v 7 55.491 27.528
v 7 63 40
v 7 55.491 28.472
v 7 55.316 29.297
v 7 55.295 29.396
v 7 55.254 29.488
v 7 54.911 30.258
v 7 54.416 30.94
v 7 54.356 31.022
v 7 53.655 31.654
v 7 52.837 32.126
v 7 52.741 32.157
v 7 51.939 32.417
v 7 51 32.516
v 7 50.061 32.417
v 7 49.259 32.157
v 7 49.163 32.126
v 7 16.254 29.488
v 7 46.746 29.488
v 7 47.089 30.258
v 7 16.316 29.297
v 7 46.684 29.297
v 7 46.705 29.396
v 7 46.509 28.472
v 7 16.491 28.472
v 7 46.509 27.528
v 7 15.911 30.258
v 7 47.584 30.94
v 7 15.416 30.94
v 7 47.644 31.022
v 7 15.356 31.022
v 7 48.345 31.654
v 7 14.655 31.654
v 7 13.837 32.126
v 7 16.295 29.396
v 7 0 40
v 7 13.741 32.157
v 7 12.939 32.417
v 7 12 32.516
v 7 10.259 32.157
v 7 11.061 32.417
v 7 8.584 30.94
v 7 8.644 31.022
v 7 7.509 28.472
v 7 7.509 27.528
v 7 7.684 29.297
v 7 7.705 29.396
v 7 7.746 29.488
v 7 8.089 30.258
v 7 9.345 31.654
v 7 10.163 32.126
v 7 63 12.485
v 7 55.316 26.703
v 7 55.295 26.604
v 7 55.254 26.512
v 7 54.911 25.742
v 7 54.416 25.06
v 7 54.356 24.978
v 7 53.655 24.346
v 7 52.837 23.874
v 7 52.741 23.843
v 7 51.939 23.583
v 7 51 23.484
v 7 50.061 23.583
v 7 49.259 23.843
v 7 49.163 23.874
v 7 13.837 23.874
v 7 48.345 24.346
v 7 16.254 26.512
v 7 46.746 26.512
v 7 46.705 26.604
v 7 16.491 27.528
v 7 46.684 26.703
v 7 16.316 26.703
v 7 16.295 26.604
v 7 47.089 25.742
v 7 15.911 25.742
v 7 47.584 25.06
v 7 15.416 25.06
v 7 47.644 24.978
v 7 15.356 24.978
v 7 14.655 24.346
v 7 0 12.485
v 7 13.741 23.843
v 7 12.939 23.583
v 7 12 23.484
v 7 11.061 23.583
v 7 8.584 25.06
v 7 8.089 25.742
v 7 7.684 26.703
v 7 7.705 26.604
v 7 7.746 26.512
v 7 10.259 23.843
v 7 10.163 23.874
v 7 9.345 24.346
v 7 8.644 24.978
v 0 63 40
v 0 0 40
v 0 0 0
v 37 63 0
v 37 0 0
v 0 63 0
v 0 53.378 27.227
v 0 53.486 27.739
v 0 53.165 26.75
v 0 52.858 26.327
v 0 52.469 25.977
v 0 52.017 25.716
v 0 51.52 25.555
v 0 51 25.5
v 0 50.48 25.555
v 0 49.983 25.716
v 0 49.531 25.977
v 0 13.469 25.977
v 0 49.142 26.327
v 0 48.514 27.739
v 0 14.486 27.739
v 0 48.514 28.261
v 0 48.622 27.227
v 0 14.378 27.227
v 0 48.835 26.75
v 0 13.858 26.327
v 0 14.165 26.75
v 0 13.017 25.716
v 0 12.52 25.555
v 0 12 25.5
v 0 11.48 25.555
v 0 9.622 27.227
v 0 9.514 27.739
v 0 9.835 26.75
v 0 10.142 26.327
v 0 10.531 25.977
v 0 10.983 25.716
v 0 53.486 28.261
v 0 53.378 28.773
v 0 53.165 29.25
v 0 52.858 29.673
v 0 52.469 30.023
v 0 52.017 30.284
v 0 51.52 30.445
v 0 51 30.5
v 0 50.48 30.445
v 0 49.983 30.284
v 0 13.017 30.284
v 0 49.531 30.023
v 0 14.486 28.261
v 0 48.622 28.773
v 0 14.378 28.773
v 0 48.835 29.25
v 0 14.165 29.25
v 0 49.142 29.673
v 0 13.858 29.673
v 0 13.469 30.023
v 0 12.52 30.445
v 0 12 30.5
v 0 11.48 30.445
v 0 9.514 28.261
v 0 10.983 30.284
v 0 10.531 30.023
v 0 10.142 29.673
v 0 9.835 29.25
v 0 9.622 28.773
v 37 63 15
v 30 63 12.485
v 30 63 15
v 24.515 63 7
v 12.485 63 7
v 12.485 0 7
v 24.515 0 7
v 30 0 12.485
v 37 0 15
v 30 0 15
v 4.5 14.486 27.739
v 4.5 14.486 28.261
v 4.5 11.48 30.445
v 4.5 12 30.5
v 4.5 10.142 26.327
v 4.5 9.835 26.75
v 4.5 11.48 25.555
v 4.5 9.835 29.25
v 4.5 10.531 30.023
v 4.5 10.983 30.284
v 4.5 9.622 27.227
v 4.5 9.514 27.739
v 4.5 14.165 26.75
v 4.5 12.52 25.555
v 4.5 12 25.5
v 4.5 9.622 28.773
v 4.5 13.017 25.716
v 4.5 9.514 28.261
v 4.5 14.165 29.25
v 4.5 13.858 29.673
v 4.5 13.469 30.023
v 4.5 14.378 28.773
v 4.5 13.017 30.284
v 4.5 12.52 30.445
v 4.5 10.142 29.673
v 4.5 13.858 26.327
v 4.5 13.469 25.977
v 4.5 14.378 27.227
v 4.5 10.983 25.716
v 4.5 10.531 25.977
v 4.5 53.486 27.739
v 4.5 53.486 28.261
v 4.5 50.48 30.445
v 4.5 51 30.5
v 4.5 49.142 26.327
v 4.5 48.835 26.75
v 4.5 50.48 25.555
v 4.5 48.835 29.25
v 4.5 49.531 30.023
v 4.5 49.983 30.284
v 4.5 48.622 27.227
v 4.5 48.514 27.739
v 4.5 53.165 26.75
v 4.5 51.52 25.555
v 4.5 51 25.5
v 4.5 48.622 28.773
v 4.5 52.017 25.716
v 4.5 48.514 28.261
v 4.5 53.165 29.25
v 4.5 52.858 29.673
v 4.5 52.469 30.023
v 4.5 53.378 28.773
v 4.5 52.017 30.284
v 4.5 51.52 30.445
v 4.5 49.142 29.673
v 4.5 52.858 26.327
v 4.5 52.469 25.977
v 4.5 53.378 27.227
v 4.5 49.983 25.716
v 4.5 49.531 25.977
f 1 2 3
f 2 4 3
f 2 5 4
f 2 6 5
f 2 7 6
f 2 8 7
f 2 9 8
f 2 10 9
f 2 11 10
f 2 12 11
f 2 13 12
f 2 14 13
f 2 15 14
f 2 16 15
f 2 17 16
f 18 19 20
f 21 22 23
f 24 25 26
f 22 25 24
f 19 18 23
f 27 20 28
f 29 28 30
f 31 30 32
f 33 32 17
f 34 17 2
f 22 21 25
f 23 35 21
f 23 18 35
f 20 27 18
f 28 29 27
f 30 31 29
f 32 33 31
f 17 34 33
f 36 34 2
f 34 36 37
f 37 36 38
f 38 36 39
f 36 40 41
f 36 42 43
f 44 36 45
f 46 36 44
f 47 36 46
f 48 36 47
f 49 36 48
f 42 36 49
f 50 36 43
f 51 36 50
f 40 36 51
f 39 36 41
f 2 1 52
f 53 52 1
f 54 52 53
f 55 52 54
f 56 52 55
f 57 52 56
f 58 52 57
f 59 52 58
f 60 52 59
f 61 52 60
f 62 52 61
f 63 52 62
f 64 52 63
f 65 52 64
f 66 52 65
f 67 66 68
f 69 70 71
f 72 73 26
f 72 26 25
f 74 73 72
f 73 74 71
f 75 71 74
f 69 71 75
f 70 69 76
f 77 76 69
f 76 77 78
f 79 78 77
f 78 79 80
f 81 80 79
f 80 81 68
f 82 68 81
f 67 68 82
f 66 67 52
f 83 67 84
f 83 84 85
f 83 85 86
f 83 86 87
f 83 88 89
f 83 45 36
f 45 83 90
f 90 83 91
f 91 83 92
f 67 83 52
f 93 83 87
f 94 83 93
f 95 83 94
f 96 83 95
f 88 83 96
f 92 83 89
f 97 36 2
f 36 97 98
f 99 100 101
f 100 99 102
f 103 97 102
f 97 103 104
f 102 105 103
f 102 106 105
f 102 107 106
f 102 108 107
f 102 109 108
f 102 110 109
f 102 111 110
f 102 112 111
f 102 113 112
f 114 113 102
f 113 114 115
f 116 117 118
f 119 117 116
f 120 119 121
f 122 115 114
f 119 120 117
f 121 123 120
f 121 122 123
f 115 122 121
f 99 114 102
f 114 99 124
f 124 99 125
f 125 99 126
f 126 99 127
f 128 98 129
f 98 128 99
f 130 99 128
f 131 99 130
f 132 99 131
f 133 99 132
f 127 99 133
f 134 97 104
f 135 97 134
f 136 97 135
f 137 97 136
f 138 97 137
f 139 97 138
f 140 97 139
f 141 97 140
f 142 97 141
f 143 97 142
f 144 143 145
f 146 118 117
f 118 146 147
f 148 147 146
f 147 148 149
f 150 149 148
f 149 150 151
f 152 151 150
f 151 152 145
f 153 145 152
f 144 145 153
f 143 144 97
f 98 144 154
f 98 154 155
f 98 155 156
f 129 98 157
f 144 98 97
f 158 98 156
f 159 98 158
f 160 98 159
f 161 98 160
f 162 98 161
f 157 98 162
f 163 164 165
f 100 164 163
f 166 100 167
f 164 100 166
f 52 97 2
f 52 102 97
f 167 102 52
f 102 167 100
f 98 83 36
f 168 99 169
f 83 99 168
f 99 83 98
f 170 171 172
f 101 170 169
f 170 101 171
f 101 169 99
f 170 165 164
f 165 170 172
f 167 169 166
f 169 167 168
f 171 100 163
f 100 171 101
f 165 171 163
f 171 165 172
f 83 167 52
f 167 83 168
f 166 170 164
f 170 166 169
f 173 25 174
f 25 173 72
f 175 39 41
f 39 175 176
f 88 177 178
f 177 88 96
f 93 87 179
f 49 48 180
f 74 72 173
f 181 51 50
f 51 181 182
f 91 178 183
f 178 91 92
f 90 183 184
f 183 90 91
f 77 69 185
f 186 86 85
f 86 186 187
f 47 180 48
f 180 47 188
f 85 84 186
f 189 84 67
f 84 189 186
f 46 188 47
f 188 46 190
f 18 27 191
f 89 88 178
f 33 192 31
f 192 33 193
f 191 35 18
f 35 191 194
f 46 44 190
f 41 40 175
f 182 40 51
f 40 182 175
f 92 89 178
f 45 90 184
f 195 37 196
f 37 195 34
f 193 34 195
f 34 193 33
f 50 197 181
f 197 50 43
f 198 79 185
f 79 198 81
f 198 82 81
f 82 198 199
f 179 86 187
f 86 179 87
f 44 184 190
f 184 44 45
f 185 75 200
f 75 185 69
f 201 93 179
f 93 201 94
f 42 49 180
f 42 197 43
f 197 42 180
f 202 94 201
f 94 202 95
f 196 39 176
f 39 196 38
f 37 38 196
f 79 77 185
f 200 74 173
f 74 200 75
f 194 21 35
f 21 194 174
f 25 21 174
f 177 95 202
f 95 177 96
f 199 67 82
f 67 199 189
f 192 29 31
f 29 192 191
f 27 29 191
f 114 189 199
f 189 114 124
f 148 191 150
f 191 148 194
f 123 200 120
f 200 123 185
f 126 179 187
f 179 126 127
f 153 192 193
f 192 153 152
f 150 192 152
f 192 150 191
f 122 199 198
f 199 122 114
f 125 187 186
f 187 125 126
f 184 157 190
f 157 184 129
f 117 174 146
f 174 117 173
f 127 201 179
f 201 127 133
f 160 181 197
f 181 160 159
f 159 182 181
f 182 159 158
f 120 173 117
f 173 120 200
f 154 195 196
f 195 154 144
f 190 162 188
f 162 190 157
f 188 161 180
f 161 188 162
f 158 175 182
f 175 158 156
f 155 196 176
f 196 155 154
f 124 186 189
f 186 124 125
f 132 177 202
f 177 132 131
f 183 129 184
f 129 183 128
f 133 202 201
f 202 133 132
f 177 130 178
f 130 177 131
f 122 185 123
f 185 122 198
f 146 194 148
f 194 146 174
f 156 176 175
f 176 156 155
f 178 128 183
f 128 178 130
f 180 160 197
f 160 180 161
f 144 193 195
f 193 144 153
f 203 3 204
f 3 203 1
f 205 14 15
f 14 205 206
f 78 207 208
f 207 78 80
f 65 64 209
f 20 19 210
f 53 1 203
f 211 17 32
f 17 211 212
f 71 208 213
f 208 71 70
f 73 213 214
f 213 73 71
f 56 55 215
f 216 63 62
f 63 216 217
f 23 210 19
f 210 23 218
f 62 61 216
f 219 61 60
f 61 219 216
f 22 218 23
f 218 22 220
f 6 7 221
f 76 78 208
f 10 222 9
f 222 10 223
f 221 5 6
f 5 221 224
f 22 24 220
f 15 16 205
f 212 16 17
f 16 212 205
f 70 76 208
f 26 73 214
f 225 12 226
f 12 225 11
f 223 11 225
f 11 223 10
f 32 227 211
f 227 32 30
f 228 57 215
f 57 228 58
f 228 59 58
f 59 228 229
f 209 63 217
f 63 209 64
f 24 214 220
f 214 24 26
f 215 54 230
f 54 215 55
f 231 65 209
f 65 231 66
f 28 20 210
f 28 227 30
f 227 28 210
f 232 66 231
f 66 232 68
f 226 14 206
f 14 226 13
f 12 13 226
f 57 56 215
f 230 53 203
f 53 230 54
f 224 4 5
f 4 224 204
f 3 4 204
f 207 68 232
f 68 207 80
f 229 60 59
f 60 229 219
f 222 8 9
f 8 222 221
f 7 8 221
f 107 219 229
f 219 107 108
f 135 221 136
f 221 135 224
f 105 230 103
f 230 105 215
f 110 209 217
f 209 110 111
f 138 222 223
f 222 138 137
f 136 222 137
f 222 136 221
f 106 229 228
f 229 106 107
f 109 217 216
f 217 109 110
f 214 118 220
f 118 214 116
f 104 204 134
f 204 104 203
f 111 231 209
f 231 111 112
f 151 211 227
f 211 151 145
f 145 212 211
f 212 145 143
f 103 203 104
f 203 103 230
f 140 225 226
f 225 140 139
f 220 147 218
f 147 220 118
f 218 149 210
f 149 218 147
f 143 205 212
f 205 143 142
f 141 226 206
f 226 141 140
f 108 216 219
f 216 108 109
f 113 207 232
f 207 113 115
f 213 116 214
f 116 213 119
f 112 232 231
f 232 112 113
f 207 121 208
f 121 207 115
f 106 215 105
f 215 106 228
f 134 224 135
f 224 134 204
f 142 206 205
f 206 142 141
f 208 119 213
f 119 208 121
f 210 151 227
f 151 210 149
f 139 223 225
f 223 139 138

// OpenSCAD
// length of the hook
hookLength = 63;

// height of the wall mounted part
hookHeight = 40;

// depth of the hook area
hookDepth = 23;

// number of holes
holeCount = 2; // [0:70]

// hole diameter
holeDiameter = 5;

// hole offset to the top and the sides of the hook
holeOffset = 12;

// activates the tapered holes
holeTapered = 1; // [0:No, 1:Yes]

// separated hook count
hookCount = 1;

// distance from hook to hook
hookDistance = 20;

// activate rounded Corners (the hook will get 2mm thicker) [EXPERIMENTAL]
roundCorners  = 0; // [0:No, 1:Yes]

holeRadius = holeDiameter / 2.;
holeRadiusCountersunk = holeRadius * 2;
holeDepthCountersunk = holeRadius * 1;
holeZ = hookHeight - holeOffset;

holeDistance = (hookLength - (2 * holeOffset)) / 
(holeCount - 1);

    
hookSeperatorDistance = (hookLength - (hookDistance * (hookCount - 1))) / (hookCount);

module MyHook(){    
    
    // set number of faces
    $fn=30; 
    
    difference(){
        if(roundCorners){
            minkowski(){
                plainMultipleHook();
                sphere(1, centered=true, $fn=20);
            }
        }else{
            plainMultipleHook();
        }
        generateHoles();
        
    }
}

module plainMultipleHook(){
    difference(){
        plainHook();
        multipleHookSpacers();
    }
}

module plainHook(){
    union(){
        // upper
        cube([7,hookLength,hookHeight]);
            
        // lower
        translate([7,0,0]) cube([hookDepth ,hookLength,7]);         
        // hook
        translate([7 + hookDepth ,0,0]) cube([7,hookLength,15]);
            
        // corners
        translate([2,0,9]) rotate([0,45,0]) cube([10,hookLength,6]);
        translate([hookDepth + 5 ,0,2]) rotate([0,-45,0]) cube([10,hookLength,6]);
   }
}

module multipleHookSpacers(){
    // seperator boxes
    if(hookCount >= 2){
        for(seperator = [1: hookCount - 1]){
            translate([13, seperator * hookSeperatorDistance + hookDistance * (seperator - 1), -1]) cube([hookDepth + 7, hookDistance, 17]);
        }
    }
}

module generateHoles(){
    if(holeCount == 1){
        holeYPosition = hookLength / 2;
        generateSingleHole(holeYPosition);
    }else{
        
        for(hole = [0: holeCount - 1]){
            holeYPosition = hole * holeDistance + holeOffset;
            generateSingleHole(holeYPosition);
        }
    }
}

module generateSingleHole(holeYPosition){
    translate([0, holeYPosition, holeZ]){
    
        // hole
        translate([-5,0,0])
        rotate([0,90,0])
        cylinder(22, holeRadius, holeRadius);
        
        // tapering
        if(holeTapered){
            translate([7 - holeDepthCountersunk, 0, 0])
            rotate([0,90,0])
            cylinder(3.1, holeRadius, holeRadiusCountersunk);
            
            translate([7.59, 0, 0])
            rotate([0,90,0])
            cylinder(10,holeRadiusCountersunk, holeRadiusCountersunk);
        }
    }
}

MyHook();
